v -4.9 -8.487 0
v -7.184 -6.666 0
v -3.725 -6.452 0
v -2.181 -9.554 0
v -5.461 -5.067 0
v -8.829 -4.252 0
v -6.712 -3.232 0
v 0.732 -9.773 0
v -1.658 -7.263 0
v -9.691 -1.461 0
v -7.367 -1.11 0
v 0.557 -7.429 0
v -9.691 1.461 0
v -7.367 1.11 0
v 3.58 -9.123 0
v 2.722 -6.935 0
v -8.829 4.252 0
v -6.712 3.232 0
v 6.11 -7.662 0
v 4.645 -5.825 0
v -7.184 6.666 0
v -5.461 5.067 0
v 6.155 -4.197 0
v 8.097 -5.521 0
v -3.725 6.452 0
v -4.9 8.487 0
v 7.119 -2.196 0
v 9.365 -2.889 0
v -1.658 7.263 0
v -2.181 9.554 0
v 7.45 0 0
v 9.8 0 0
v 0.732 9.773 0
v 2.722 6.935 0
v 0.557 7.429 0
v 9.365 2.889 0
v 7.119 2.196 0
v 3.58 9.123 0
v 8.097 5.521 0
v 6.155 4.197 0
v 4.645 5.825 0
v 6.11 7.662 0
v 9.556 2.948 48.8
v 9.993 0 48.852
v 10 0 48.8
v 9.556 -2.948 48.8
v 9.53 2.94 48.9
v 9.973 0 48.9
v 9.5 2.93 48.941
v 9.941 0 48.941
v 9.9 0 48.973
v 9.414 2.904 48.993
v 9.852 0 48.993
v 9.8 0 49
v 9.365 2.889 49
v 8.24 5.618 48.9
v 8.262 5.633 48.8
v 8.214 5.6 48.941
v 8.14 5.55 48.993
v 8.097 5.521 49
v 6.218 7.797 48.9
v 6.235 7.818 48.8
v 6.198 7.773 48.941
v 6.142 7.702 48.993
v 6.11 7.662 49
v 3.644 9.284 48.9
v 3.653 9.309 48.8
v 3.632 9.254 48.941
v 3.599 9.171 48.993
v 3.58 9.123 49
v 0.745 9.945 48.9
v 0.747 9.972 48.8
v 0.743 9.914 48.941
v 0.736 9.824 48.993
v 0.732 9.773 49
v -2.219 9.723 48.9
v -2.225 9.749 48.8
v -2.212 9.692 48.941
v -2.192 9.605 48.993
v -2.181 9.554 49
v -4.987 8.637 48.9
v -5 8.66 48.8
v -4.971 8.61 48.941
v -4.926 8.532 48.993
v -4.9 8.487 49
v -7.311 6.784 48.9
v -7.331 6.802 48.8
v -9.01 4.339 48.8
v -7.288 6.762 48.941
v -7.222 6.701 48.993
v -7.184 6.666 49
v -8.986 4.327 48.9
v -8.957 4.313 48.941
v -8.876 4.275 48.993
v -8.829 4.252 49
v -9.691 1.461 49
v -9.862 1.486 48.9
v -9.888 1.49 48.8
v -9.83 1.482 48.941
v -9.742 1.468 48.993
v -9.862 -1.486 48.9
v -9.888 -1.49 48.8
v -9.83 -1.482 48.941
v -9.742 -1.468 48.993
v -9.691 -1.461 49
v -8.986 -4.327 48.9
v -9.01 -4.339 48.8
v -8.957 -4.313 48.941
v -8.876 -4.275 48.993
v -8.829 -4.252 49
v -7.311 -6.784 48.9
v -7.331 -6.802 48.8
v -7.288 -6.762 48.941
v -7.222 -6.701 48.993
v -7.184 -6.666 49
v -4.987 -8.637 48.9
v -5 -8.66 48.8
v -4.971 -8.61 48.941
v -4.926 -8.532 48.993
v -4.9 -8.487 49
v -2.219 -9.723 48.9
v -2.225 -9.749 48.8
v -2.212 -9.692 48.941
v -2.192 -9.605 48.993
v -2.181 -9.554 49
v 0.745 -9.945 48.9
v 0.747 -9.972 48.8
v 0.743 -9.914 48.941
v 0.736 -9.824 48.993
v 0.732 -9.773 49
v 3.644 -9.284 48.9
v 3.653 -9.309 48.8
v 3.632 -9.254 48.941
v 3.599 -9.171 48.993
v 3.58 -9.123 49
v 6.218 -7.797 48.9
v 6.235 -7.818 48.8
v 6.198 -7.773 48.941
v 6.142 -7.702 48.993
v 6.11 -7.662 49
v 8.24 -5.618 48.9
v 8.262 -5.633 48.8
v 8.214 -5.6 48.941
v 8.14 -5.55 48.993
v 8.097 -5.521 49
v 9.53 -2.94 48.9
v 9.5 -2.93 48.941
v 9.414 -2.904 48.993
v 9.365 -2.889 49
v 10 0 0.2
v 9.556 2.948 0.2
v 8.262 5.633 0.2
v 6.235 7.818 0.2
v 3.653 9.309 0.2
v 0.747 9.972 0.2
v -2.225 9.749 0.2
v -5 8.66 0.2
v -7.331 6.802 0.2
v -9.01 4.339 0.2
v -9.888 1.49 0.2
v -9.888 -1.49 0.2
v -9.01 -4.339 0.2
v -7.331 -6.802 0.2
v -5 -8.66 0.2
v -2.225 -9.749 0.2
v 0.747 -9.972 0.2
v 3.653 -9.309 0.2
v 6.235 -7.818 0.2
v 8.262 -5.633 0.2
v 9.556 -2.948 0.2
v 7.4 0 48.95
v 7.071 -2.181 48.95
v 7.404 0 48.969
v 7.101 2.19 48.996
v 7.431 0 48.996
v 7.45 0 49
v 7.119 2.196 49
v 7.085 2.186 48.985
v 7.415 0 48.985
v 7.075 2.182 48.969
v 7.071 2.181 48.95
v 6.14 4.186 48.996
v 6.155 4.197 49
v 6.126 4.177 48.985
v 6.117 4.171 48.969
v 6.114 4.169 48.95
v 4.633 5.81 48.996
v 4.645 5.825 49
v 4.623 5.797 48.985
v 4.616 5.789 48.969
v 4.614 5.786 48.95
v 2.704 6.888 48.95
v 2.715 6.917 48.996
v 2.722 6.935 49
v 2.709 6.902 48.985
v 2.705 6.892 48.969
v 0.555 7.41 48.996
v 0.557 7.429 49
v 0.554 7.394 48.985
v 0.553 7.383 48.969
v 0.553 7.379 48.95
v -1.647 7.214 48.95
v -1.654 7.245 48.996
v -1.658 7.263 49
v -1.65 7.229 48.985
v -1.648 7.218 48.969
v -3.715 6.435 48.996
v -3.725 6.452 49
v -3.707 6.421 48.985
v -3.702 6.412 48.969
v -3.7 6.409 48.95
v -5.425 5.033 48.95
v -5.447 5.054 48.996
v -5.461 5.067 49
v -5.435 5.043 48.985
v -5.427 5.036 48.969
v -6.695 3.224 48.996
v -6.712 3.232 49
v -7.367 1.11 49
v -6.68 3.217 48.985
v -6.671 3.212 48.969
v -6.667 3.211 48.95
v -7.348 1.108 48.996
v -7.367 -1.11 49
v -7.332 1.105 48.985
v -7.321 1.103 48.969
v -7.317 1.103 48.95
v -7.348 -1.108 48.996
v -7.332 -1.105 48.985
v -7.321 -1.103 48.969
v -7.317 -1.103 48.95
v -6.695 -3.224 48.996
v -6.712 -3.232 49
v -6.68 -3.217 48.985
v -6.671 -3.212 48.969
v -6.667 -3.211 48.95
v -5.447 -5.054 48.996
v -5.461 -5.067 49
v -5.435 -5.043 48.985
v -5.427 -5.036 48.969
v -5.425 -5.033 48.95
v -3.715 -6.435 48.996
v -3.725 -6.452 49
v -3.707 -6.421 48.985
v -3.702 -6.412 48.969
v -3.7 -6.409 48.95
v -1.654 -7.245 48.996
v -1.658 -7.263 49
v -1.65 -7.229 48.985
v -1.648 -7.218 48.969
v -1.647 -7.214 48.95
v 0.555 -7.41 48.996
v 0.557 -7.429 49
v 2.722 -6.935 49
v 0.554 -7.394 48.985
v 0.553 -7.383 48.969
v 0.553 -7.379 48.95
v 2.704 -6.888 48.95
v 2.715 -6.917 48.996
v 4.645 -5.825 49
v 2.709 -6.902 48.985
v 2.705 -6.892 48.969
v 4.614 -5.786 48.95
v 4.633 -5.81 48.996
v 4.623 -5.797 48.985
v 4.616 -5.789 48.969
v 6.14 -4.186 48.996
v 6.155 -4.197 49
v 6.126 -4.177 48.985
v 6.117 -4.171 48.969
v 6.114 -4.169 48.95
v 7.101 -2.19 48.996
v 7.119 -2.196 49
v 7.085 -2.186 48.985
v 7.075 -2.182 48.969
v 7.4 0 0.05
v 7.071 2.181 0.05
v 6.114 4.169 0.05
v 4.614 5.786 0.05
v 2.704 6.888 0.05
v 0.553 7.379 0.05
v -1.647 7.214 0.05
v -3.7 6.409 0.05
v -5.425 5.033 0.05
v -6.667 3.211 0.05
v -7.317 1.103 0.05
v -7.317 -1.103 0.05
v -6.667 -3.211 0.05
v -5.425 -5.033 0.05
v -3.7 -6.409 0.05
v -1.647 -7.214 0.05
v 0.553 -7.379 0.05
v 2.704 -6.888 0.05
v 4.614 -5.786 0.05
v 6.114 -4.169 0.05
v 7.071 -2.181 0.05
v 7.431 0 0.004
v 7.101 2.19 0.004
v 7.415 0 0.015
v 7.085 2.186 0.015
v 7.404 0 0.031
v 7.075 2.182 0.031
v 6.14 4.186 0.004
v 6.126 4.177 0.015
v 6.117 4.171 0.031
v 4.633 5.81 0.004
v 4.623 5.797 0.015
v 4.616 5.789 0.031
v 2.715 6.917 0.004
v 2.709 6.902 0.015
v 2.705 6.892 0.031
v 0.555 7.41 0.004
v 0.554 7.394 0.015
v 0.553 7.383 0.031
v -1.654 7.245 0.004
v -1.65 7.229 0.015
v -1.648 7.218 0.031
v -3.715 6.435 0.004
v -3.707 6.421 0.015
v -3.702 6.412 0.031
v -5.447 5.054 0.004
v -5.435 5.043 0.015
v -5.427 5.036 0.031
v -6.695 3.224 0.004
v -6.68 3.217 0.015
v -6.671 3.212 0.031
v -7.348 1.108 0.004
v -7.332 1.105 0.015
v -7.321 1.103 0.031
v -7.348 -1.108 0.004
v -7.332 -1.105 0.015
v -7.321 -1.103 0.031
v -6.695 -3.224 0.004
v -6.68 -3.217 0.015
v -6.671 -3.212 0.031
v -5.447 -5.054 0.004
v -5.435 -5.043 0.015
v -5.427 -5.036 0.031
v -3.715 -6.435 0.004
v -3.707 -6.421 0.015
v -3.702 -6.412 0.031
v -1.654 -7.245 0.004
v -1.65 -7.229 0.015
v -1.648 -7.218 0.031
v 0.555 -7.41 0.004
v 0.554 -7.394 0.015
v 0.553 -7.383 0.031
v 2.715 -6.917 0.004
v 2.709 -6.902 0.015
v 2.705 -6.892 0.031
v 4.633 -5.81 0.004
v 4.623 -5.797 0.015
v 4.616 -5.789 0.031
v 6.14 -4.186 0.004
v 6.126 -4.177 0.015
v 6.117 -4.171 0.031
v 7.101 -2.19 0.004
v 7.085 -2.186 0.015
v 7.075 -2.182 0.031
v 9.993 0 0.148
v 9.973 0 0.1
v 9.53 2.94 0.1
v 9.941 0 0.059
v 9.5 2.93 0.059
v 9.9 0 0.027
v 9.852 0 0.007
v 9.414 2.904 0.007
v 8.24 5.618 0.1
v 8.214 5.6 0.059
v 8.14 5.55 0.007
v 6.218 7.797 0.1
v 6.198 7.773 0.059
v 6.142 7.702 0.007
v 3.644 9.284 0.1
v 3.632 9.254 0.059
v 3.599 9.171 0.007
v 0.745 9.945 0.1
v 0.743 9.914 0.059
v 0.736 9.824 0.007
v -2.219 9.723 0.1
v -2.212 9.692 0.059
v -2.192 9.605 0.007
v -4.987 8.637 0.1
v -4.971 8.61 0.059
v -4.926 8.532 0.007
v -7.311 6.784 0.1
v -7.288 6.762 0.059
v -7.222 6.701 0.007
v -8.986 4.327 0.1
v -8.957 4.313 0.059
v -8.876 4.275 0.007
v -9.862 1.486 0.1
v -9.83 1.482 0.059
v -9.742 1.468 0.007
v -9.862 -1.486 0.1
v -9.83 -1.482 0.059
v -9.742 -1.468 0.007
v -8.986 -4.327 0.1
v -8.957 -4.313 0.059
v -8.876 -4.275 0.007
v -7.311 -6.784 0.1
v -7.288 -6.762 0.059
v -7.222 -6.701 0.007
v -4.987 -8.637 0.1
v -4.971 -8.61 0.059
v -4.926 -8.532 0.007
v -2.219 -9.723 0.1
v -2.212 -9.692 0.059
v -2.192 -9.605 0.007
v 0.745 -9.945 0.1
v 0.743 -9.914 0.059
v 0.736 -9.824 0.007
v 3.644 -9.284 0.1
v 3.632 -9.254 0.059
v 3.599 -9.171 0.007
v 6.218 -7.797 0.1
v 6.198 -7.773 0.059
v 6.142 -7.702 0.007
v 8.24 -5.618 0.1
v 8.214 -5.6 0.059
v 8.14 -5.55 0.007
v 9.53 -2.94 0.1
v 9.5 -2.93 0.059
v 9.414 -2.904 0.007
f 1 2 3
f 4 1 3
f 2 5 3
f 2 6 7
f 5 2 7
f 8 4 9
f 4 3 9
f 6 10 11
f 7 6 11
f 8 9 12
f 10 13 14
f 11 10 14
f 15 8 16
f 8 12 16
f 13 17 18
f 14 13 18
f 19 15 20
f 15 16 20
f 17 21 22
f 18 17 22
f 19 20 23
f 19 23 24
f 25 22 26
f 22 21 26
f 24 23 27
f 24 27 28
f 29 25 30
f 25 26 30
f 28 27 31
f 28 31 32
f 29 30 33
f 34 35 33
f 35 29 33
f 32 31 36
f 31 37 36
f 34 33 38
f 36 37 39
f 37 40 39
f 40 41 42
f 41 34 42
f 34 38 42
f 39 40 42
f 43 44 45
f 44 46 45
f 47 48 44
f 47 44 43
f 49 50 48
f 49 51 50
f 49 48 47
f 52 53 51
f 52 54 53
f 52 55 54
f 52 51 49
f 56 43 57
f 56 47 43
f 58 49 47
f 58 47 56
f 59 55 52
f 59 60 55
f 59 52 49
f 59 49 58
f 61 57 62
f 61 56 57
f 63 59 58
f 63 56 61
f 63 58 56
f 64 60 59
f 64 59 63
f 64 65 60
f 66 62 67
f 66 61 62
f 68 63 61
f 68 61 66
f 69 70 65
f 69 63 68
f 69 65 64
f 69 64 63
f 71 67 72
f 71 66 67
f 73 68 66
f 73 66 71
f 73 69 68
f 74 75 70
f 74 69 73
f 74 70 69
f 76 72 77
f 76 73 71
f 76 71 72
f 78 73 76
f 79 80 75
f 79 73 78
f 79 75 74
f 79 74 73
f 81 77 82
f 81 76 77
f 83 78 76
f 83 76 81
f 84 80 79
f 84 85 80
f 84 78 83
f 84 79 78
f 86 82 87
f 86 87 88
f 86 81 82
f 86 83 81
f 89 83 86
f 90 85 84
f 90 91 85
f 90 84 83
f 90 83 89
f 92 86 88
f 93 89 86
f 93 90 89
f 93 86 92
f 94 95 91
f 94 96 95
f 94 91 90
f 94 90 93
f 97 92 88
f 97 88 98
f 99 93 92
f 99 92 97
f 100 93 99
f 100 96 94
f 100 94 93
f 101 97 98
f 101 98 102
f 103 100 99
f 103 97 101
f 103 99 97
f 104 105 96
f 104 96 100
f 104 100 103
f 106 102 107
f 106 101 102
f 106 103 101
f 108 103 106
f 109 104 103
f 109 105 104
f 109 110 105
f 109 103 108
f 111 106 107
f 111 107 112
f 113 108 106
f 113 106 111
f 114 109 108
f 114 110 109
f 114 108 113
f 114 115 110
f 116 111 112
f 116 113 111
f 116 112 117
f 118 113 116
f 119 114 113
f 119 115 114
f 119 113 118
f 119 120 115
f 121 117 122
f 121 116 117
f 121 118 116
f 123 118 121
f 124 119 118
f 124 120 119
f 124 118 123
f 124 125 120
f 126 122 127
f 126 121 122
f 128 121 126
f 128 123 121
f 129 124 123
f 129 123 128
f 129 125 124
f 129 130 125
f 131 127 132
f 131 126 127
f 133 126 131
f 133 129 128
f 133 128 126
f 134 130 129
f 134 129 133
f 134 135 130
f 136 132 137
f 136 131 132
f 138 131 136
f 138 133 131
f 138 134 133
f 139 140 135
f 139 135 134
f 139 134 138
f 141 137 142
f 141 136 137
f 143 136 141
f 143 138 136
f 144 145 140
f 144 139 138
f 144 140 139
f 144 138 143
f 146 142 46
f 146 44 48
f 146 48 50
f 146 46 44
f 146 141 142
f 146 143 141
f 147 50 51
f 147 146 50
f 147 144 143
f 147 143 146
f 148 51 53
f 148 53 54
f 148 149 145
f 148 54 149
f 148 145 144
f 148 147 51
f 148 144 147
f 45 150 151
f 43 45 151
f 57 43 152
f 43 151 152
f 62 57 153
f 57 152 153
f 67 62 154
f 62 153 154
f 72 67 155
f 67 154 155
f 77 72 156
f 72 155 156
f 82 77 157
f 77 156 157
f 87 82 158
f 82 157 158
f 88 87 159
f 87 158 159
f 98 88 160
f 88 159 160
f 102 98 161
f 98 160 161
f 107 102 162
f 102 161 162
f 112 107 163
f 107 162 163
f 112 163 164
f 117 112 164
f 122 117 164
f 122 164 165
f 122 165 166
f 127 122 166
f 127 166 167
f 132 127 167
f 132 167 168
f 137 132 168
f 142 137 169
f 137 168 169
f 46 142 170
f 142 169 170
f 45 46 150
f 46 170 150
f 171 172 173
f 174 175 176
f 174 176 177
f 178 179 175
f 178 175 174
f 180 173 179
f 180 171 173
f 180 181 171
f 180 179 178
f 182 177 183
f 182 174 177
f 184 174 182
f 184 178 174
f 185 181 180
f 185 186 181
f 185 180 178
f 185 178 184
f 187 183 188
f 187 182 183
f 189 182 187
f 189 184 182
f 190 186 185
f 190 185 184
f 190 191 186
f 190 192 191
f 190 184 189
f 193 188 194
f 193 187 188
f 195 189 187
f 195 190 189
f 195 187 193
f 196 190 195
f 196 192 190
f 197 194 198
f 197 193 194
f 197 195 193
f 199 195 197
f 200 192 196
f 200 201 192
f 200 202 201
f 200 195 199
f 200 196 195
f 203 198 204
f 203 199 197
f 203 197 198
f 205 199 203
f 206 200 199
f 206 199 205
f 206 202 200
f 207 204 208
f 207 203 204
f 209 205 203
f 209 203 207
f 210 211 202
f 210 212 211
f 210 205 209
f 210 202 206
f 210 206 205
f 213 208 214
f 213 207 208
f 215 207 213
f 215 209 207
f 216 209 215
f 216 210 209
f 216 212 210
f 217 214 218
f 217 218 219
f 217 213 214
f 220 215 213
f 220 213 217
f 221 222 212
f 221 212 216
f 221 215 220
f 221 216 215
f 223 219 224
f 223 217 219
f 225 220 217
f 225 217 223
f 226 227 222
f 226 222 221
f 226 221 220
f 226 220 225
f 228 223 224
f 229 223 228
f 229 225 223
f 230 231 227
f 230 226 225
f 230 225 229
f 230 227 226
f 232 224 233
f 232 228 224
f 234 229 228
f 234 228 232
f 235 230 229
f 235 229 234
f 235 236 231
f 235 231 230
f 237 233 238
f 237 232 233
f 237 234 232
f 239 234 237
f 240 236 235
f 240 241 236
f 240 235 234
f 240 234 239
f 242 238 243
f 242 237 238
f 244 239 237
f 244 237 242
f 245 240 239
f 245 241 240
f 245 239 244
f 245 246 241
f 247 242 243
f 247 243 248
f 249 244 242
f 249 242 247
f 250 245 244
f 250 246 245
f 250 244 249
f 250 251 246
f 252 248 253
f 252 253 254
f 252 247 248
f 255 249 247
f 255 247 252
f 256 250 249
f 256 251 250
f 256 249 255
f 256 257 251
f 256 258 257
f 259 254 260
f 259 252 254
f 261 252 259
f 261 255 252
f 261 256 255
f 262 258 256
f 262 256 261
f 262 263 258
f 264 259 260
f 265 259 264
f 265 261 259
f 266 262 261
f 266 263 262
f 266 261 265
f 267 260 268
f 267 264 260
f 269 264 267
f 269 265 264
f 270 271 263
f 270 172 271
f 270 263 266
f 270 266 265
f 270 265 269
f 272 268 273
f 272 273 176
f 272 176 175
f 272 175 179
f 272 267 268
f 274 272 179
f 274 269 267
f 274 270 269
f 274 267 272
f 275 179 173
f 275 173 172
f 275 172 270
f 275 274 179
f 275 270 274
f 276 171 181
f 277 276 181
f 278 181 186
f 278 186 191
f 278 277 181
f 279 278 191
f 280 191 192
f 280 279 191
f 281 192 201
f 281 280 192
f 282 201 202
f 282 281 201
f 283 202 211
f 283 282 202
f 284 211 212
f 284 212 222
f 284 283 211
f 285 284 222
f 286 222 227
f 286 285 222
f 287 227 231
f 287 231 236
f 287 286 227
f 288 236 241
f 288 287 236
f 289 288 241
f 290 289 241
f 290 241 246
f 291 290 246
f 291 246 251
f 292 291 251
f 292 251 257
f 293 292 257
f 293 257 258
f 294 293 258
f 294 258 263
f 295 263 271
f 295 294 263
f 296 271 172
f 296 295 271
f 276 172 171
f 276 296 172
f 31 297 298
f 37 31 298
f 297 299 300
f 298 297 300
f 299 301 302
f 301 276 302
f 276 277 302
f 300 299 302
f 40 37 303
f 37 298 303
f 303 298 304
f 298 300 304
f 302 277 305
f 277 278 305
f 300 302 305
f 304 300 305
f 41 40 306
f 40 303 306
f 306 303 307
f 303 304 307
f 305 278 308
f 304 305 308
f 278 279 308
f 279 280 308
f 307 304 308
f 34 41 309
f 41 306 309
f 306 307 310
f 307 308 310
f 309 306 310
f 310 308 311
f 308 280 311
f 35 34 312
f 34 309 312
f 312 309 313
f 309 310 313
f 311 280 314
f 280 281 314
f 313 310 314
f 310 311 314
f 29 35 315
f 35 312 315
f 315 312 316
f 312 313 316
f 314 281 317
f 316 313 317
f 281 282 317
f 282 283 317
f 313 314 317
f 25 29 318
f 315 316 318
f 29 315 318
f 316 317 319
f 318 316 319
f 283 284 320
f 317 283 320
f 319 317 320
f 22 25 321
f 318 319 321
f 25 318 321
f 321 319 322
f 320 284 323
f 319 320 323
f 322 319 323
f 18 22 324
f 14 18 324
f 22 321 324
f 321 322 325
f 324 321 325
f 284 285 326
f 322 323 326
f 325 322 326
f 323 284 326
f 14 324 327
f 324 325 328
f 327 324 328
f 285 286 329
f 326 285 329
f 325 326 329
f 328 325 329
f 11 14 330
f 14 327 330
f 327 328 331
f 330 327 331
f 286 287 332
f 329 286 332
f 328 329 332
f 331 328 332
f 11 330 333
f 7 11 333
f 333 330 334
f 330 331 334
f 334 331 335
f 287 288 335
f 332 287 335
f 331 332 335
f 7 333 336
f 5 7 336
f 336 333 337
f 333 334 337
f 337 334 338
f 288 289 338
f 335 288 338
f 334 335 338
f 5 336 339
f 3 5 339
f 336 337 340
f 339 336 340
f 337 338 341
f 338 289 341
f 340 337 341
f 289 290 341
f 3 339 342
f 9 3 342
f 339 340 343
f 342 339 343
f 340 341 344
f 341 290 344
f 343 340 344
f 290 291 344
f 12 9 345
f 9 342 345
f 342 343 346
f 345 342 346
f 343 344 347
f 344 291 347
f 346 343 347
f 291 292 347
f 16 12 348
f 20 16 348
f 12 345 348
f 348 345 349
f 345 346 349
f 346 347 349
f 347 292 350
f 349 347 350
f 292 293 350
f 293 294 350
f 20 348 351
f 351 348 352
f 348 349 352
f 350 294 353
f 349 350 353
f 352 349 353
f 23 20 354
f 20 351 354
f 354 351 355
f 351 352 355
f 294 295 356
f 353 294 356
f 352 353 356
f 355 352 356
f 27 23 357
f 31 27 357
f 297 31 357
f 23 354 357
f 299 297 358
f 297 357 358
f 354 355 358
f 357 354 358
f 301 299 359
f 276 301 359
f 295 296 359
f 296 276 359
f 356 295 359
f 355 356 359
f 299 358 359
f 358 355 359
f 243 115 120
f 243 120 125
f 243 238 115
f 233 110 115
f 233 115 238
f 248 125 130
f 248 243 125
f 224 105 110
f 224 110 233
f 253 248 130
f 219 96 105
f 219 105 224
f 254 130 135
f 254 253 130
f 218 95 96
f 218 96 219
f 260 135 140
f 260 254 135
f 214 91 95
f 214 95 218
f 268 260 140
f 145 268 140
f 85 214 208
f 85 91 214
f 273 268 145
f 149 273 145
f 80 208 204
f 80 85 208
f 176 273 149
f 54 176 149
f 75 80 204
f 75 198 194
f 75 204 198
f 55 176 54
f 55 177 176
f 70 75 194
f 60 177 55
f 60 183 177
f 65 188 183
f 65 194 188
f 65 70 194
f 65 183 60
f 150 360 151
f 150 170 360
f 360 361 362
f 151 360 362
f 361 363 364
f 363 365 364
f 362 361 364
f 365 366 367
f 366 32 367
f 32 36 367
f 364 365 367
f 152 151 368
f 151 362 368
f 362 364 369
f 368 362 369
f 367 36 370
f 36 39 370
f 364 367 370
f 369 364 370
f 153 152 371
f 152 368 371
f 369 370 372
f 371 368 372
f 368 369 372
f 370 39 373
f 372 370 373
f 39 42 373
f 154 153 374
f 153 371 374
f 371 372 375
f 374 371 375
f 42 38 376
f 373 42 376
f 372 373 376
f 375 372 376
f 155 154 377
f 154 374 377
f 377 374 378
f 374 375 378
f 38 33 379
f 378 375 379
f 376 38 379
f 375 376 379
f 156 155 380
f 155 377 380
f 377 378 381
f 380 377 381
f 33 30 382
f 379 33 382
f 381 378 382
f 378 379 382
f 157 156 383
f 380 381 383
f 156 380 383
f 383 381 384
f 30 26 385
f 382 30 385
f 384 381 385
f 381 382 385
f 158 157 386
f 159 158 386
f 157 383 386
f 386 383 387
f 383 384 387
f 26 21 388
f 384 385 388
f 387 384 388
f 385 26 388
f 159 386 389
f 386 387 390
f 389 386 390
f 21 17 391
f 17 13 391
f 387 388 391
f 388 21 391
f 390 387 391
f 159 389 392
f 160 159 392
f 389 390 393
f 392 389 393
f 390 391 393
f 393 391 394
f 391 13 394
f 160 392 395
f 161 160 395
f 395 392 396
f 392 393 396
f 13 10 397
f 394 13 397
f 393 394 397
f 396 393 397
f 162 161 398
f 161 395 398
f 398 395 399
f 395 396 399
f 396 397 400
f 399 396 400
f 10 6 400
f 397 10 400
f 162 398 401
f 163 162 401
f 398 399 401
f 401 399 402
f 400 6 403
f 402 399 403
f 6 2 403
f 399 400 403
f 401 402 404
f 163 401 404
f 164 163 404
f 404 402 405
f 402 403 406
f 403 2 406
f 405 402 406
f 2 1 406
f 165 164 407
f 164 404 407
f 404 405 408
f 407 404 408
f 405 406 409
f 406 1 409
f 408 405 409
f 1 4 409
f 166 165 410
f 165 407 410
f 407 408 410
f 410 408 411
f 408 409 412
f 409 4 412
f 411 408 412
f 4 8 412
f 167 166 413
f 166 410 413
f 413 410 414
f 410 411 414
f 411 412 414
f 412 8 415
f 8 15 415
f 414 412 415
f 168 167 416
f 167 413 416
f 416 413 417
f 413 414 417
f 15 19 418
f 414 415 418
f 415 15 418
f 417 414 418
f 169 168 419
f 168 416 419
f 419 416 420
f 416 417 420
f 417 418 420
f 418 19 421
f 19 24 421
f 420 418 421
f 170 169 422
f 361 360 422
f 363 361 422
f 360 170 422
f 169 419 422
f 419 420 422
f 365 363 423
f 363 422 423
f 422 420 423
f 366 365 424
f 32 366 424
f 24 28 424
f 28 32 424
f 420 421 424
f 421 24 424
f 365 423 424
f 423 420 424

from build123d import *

# Parameters (mm, degrees)
SCHIZZO1_R                   = 10
SCHIZZO1_R_2                 = 7.4
ESTRUSIONE_ESTRUSIONE1_DEPTH = 49
RACCORDO1_R                  = 0.2
RACCORDO2_R                  = 0.05


with BuildPart() as part:
    # Schizzo1 → Estrusione-Estrusione1 (new body)
    with BuildSketch(Plane.XY):
        Circle(SCHIZZO1_R)
        Circle(SCHIZZO1_R_2, mode=Mode.SUBTRACT)
    extrude(amount=ESTRUSIONE_ESTRUSIONE1_DEPTH)

    # Raccordo1
    raccordo1_edges = [part.edges().sort_by_distance(p)[0] for p in [
        (-10, 0, 0),
        (-10, 0, 49),
    ]]
    fillet(raccordo1_edges, radius=RACCORDO1_R)

    # Raccordo2
    raccordo2_edges = [part.edges().sort_by_distance(p)[0] for p in [
        (-7.4, 0, 0),
        (-7.4, 0, 49),
    ]]
    fillet(raccordo2_edges, radius=RACCORDO2_R)


solid = part.part
